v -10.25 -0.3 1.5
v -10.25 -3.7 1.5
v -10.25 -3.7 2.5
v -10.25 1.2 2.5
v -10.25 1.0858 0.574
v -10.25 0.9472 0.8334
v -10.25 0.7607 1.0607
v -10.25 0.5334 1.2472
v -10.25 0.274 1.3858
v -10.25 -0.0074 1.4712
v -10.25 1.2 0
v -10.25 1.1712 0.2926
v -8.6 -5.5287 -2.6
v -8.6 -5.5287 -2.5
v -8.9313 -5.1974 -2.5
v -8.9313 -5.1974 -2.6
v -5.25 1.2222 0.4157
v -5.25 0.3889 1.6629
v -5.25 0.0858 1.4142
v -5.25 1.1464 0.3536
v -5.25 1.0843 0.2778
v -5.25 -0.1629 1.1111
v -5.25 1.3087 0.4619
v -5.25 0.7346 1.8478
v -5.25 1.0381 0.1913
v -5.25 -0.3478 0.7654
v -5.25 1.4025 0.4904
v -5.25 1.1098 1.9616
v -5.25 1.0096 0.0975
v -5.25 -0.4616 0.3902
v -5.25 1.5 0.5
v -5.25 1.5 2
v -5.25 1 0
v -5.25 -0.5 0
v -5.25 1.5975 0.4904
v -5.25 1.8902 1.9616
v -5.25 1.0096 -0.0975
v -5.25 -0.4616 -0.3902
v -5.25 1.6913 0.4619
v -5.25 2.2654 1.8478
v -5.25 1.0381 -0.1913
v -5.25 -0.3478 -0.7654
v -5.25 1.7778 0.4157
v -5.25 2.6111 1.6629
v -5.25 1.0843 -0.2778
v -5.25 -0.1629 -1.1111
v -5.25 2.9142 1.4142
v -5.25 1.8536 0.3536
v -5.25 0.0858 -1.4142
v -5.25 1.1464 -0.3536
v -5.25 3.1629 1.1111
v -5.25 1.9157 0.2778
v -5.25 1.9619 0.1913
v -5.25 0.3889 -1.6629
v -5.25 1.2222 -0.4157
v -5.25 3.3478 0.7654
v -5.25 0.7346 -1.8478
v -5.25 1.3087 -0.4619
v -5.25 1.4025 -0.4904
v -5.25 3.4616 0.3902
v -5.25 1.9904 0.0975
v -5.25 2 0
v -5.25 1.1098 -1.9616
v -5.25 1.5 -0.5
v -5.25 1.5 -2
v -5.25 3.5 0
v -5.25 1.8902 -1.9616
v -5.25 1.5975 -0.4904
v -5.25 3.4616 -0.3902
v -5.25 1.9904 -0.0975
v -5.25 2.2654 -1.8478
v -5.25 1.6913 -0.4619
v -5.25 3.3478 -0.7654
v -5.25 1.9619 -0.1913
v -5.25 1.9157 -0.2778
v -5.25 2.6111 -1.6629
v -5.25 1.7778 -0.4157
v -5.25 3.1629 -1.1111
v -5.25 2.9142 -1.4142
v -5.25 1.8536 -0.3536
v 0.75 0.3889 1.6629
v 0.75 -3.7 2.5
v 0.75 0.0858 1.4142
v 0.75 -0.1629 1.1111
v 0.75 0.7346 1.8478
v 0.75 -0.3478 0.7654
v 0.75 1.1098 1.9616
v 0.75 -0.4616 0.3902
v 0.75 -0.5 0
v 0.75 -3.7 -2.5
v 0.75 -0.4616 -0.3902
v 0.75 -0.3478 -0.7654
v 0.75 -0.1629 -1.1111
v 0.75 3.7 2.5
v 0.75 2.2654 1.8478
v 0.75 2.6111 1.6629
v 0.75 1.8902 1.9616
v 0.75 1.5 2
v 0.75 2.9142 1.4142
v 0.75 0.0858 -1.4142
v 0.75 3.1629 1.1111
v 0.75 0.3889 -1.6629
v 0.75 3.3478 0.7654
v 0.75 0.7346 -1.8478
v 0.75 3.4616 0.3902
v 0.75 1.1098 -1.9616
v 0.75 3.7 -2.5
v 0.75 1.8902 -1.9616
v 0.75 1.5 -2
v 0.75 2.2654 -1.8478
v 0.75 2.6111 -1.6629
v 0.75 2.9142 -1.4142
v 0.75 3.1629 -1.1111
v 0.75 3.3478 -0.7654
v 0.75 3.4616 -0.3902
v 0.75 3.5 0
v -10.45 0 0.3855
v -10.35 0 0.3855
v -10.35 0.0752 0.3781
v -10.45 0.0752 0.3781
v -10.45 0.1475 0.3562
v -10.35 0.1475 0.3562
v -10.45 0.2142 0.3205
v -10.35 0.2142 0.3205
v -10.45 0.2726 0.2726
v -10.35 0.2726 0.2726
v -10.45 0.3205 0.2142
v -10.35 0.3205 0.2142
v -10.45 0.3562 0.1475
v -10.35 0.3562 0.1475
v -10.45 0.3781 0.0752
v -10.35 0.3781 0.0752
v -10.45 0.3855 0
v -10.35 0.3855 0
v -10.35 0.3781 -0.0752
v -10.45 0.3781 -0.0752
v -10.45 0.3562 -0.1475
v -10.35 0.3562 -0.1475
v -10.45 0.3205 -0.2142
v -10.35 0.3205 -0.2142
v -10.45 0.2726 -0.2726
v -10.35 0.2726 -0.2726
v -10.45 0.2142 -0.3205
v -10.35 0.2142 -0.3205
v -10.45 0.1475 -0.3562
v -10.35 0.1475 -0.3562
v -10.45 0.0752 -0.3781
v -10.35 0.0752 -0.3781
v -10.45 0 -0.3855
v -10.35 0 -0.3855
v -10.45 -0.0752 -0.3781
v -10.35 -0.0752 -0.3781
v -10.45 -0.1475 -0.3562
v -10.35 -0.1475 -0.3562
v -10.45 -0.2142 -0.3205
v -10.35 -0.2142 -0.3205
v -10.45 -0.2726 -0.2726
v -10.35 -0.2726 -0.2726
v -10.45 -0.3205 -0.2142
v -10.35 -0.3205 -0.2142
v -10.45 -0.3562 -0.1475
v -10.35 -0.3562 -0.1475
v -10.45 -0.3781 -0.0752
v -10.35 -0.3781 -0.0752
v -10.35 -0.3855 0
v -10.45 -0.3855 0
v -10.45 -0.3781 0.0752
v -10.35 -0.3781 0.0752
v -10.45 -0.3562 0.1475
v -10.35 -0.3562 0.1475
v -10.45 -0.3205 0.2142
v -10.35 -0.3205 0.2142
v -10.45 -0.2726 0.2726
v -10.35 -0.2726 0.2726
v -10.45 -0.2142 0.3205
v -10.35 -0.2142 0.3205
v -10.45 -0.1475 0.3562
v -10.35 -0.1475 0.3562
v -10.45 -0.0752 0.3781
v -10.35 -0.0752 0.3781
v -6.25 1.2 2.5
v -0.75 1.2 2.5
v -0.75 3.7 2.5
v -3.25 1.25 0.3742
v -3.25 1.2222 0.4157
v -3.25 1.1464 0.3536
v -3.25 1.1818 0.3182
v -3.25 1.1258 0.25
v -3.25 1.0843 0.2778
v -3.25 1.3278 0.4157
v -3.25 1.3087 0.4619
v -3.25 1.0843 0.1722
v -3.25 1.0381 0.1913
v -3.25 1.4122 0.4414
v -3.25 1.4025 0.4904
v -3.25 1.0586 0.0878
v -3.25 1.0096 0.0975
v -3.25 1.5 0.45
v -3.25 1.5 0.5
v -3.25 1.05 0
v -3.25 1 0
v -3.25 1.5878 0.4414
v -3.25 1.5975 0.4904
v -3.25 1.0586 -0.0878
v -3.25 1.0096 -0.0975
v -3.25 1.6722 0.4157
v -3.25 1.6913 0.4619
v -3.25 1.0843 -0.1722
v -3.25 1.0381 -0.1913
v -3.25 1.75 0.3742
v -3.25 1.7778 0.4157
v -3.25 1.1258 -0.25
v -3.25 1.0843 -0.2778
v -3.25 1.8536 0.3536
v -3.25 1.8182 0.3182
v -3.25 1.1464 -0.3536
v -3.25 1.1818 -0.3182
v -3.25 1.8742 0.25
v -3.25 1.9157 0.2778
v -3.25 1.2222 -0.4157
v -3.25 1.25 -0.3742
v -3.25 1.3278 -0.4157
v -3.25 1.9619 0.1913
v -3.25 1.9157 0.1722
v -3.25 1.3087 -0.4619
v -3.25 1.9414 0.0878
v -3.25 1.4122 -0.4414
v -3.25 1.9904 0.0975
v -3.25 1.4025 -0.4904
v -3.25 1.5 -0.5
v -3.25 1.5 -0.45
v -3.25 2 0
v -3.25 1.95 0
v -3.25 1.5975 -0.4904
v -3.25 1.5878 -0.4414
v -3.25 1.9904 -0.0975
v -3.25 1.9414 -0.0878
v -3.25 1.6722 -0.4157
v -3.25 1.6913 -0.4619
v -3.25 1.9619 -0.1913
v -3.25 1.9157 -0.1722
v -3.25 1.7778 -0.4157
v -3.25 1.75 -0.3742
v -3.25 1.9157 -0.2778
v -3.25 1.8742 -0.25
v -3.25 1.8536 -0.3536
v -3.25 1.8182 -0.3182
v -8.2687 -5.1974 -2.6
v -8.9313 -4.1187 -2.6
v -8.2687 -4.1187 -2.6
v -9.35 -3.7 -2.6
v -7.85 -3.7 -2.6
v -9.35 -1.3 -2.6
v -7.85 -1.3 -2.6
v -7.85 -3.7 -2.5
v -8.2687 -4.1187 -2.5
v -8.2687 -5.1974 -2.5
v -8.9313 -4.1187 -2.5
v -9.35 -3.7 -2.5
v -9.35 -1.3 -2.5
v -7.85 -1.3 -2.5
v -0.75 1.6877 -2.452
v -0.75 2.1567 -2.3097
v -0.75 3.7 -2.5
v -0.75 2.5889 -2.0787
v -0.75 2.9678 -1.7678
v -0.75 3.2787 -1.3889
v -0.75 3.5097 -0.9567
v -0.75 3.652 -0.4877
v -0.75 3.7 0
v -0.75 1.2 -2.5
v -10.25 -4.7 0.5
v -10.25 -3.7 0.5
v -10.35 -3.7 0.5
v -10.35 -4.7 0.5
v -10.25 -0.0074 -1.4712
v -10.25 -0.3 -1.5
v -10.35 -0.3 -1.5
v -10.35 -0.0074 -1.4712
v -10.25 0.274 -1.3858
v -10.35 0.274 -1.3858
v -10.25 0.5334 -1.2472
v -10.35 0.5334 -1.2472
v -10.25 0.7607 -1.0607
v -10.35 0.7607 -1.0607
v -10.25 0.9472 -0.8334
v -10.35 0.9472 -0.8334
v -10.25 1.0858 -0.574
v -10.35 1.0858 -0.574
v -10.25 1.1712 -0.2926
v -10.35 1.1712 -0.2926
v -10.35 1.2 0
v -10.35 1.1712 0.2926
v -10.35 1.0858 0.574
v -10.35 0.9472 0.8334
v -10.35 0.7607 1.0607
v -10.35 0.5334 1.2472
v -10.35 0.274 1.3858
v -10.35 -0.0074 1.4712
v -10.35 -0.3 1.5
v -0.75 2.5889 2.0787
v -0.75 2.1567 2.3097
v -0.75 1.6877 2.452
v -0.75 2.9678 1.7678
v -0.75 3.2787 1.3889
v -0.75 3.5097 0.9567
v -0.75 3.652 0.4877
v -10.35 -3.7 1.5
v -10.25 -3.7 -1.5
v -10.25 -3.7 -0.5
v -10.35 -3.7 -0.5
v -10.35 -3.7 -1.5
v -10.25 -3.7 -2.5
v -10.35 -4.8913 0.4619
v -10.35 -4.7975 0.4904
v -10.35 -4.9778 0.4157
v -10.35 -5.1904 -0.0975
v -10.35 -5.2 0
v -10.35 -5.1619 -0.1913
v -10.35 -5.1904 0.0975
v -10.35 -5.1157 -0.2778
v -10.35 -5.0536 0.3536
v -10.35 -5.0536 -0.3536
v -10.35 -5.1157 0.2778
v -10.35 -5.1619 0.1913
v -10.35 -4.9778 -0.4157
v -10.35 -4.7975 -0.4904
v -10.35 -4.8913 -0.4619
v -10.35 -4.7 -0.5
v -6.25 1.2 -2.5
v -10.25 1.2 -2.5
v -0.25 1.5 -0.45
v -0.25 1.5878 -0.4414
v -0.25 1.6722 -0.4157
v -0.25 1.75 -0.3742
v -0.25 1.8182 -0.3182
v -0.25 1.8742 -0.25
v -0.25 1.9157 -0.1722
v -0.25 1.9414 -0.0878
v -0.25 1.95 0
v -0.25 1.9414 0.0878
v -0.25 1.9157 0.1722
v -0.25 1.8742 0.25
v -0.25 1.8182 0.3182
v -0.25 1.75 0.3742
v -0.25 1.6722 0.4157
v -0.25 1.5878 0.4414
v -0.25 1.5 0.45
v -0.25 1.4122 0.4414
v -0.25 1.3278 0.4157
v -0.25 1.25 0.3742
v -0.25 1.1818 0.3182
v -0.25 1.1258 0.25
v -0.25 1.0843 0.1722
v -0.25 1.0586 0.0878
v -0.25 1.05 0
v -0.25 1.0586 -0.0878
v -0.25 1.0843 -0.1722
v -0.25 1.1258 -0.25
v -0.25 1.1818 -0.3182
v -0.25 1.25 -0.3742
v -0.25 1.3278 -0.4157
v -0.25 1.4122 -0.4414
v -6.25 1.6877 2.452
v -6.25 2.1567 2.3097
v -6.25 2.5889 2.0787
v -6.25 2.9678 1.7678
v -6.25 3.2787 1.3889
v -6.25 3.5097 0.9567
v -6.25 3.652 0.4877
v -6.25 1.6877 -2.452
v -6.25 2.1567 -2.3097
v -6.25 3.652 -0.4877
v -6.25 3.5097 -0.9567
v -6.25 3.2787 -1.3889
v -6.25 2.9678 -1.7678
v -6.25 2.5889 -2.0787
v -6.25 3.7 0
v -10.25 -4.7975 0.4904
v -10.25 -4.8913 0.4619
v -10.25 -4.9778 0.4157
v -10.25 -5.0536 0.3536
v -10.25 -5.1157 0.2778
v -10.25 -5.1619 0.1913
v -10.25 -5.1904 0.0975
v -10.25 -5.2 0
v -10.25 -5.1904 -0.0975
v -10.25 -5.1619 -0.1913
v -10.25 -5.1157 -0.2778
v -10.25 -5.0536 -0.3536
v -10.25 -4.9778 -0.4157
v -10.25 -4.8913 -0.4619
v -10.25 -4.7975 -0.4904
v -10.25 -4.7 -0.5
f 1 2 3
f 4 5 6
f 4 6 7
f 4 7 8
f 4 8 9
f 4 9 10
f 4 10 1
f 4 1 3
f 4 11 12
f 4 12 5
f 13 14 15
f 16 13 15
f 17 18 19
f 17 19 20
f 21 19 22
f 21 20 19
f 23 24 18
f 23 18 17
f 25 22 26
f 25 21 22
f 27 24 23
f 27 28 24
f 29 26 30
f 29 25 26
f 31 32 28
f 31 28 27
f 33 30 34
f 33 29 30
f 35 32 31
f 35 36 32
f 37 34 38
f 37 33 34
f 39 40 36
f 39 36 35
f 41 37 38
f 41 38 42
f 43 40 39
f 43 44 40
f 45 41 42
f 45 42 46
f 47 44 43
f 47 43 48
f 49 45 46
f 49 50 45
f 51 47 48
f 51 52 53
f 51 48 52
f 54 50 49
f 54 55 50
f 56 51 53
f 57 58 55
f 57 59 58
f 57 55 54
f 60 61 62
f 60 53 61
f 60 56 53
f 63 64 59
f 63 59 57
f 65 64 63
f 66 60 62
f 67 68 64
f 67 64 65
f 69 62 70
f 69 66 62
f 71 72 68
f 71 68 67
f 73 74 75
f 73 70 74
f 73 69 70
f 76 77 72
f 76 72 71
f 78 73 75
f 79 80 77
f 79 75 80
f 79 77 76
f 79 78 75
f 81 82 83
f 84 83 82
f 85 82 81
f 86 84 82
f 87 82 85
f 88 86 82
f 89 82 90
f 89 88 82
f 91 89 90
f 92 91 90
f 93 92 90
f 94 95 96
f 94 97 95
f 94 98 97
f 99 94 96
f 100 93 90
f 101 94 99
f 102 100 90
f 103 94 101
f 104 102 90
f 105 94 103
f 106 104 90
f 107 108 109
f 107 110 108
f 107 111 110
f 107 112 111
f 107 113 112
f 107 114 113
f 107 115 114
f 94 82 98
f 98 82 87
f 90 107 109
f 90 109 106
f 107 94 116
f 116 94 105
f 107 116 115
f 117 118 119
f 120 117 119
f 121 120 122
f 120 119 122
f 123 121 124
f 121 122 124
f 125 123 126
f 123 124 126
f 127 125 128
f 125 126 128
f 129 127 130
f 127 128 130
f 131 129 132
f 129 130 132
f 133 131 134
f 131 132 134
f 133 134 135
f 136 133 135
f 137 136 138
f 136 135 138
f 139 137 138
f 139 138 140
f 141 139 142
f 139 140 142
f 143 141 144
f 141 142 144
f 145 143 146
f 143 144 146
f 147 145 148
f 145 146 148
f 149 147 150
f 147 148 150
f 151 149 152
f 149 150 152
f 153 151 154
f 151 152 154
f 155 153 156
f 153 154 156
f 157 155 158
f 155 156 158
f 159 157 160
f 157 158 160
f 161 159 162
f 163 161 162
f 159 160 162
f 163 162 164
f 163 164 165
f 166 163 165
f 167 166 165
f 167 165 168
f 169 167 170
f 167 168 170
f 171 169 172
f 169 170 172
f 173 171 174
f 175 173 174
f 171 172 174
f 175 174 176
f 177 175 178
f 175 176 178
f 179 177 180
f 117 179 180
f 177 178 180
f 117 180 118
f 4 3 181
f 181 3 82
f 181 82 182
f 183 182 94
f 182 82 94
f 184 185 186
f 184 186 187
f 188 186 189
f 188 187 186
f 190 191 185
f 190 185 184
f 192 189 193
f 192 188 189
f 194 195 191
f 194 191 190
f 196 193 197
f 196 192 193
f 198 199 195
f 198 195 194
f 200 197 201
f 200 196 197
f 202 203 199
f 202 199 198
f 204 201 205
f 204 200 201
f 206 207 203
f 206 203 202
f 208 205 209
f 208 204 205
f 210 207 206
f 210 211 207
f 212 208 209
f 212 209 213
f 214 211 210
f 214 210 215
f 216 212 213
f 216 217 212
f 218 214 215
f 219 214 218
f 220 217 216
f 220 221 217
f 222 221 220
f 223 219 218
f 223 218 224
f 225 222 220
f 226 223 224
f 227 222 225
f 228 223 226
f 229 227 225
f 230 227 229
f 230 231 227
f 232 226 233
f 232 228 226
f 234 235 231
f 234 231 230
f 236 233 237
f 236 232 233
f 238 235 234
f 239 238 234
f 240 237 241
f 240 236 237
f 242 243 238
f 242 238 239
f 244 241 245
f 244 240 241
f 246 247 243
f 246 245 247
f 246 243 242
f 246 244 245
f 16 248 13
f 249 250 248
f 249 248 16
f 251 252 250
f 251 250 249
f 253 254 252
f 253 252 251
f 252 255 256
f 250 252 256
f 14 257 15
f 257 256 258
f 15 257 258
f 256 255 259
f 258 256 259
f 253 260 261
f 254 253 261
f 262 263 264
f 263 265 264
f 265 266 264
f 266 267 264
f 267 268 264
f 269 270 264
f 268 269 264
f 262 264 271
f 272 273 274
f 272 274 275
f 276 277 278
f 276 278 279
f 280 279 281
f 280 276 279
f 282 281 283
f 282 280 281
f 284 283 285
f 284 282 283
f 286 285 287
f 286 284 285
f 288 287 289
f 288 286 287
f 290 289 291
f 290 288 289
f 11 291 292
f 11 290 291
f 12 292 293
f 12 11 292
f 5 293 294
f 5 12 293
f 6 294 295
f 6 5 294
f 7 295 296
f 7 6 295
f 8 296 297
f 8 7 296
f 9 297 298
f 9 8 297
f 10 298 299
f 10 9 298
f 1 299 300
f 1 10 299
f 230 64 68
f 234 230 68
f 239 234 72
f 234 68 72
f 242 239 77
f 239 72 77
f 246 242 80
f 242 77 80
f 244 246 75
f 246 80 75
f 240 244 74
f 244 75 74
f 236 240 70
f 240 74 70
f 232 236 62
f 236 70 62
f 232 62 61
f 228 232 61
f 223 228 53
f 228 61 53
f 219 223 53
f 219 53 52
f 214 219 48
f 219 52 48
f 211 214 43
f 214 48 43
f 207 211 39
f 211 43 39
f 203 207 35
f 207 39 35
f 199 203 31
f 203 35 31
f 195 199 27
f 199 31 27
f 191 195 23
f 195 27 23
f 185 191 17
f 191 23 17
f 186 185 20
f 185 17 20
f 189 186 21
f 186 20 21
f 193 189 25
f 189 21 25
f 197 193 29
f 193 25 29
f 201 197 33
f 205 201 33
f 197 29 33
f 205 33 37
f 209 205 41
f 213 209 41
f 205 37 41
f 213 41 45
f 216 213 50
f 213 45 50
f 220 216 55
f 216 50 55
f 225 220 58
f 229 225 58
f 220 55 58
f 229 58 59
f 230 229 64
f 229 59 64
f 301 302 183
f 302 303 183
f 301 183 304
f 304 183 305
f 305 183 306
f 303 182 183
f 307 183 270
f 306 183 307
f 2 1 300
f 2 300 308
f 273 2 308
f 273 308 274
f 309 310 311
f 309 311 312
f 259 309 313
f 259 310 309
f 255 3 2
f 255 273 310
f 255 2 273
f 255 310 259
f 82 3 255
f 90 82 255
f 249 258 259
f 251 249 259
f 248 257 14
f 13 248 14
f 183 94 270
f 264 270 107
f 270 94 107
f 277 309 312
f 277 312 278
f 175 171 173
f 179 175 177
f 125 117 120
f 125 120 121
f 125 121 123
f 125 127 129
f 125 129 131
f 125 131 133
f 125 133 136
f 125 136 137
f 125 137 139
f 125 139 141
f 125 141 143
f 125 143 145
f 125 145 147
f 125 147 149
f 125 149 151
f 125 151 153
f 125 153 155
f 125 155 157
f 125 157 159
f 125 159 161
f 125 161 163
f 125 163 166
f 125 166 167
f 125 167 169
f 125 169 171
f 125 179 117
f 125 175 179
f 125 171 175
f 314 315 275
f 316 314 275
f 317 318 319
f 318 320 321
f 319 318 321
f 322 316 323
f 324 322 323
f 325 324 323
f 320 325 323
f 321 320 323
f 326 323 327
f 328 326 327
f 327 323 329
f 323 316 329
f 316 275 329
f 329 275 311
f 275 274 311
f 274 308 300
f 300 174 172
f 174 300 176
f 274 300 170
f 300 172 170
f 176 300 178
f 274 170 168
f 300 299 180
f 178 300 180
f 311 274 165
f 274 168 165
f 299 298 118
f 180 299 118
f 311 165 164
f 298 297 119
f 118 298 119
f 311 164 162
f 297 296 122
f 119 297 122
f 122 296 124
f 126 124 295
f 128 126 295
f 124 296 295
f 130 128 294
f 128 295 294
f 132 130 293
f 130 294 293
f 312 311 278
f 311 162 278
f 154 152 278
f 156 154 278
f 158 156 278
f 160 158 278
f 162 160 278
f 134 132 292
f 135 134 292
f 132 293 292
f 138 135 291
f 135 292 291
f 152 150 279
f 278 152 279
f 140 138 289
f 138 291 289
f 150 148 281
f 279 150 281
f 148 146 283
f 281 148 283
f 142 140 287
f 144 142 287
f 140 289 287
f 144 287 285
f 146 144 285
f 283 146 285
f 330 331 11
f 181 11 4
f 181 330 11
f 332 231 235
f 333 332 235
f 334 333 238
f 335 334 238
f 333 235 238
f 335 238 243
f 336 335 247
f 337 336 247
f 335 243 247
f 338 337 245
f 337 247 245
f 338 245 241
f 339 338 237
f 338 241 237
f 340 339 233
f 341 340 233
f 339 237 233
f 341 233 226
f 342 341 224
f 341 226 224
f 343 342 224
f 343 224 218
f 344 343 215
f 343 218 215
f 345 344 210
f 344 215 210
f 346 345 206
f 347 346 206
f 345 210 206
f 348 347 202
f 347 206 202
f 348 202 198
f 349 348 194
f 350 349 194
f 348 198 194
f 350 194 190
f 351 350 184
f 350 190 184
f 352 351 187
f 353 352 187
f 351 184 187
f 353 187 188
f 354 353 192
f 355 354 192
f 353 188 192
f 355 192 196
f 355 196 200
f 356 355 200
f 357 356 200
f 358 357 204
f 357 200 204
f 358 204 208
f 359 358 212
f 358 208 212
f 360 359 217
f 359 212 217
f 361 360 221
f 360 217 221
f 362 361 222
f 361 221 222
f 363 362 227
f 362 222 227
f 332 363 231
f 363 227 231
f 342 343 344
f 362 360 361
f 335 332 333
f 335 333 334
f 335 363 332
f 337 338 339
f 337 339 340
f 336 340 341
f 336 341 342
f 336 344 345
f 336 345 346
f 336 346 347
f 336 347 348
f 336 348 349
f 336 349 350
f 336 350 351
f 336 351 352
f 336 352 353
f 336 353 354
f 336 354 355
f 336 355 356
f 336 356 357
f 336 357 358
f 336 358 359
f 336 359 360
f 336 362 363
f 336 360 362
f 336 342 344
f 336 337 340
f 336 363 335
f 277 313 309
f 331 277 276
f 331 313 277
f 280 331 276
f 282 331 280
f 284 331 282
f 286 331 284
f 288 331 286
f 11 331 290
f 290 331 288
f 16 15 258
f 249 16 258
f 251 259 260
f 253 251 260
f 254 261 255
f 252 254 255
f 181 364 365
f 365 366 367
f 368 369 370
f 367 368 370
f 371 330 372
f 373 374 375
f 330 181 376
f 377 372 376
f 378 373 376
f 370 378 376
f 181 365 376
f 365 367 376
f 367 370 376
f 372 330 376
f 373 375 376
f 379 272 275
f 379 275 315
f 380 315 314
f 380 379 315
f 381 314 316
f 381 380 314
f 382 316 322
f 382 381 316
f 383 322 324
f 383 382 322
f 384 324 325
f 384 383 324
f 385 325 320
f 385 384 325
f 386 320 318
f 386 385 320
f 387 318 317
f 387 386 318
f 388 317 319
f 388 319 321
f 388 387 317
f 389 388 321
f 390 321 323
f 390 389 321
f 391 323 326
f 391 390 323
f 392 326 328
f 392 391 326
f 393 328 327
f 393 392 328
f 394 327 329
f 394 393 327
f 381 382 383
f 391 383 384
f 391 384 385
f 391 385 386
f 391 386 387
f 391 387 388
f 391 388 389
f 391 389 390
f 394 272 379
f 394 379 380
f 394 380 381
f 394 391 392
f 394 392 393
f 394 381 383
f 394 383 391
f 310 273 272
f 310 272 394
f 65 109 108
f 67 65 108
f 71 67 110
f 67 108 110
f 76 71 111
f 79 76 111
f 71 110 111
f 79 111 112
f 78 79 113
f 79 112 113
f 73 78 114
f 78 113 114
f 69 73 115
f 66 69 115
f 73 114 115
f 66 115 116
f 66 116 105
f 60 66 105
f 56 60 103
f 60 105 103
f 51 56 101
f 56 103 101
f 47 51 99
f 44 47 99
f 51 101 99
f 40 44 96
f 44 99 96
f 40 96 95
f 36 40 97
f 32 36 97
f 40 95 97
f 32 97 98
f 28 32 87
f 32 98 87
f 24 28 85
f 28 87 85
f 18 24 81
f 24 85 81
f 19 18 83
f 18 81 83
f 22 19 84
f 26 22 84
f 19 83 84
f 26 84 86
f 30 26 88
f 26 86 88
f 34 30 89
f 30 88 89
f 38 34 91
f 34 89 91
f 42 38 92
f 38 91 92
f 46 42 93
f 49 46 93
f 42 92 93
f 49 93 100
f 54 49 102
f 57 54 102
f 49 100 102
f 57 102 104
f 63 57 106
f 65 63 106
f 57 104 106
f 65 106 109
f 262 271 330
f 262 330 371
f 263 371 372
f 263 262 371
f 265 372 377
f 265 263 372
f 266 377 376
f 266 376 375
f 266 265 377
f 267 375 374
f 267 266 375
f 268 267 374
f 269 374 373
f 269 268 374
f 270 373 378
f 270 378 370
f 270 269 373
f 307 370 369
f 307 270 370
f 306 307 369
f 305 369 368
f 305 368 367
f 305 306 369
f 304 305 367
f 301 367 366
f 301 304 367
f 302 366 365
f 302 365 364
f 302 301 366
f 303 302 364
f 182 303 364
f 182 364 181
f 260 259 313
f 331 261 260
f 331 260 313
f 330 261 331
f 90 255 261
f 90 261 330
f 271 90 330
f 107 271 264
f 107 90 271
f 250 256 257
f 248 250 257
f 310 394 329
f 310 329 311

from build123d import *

# Parameters (mm, degrees)
CROQUIS1_W     = 5
CROQUIS1_H     = 7.4
EXTRUIR1_DEPTH = 0.75
EXTRUIR2_DEPTH = 5.5
CROQUIS3_W     = 5
CROQUIS3_H     = 4.9
EXTRUIR3_DEPTH = 4
CROQUIS4_R     = 2
EXTRUIR4_DEPTH = 6
CROQUIS5_R     = 0.5
EXTRUIR5_DEPTH = 2
CROQUIS6_R     = 0.45
EXTRUIR6_DEPTH = 3
EXTRUIR7_DEPTH = 0.1
CROQUIS8_R     = 0.385516529
EXTRUIR8_DEPTH = 0.1
EXTRUIR9_DEPTH = 0.1


with BuildPart() as part:
    # Croquis1 → Extruir1 (new, symmetric)
    with BuildSketch(Plane(origin=(0, 0, 0), x_dir=(0, 0, -1), z_dir=(1, 0, 0))):
        Rectangle(CROQUIS1_W, CROQUIS1_H)
    extrude(amount=EXTRUIR1_DEPTH, both=True)

    # Croquis2 → Extruir2 (add)
    with BuildSketch(Plane.ZY.offset(0.75)):
        with BuildLine():
            Line((-2.5, -3.7), (-2.5, 1.2))
            ThreePointArc((-2.5, 1.2), (0, 3.7), (2.5, 1.2))
            Line((2.5, 1.2), (2.5, -3.7))
            Line((2.5, -3.7), (-2.5, -3.7))
        make_face()
    extrude(amount=EXTRUIR2_DEPTH)

    # Croquis3 → Extruir3 (add)
    with BuildSketch(Plane.ZY.offset(6.25)):
        with Locations((0, -1.25)):
            Rectangle(CROQUIS3_W, CROQUIS3_H)
    extrude(amount=EXTRUIR3_DEPTH)

    # Croquis4 → Extruir4 (cut)
    with BuildSketch(Plane(origin=(0.75, 0, 0), x_dir=(0, 0, -1), z_dir=(1, 0, 0))):
        with Locations((0, 1.5)):
            Circle(CROQUIS4_R)
    extrude(amount=-EXTRUIR4_DEPTH, mode=Mode.SUBTRACT)

    # Croquis5 → Extruir5 (add)
    with BuildSketch(Plane(origin=(-5.25, 0, 0), x_dir=(0, 0, -1), z_dir=(1, 0, 0))):
        with Locations((0, 1.5)):
            Circle(CROQUIS5_R)
    extrude(amount=EXTRUIR5_DEPTH)

    # Croquis6 → Extruir6 (add)
    with BuildSketch(Plane(origin=(-3.25, 0, 0), x_dir=(0, 0, -1), z_dir=(1, 0, 0))):
        with Locations((0, 1.5)):
            Circle(CROQUIS6_R)
    extrude(amount=EXTRUIR6_DEPTH)

    # Croquis7 → Extruir7 (add)
    with BuildSketch(Plane.ZY.offset(10.25)):
        with BuildLine():
            Line((-1.5, -3.7), (-1.5, -0.3))
            ThreePointArc((-1.5, -0.3), (0, 1.2), (1.5, -0.3))
            Line((1.5, -0.3), (1.5, -3.7))
            Line((1.5, -3.7), (0.5, -3.7))
            Line((0.5, -3.7), (0.5, -4.7))
            ThreePointArc((0.5, -4.7), (0, -5.2), (-0.5, -4.7))
            Line((-0.5, -4.7), (-0.5, -3.7))
            Line((-0.5, -3.7), (-1.5, -3.7))
        make_face()
    extrude(amount=EXTRUIR7_DEPTH)

    # Croquis8 → Extruir8 (add)
    with BuildSketch(Plane.ZY.offset(10.35)):
        Circle(CROQUIS8_R)
    extrude(amount=EXTRUIR8_DEPTH)

    # Croquis9 → Extruir9 (add)
    with BuildSketch(Plane(origin=(0, 0, -2.5), x_dir=(-1, 0, 0), z_dir=(0, 0, -1))):
        Polygon((7.85, -3.7), (8.268709763, -4.118709763), (8.268709763, -5.1974269), (8.6, -5.528717137), (8.931290237, -5.1974269), (8.931290237, -4.118709763), (9.35, -3.7), (9.35, -1.3), (7.85, -1.3), align=None)
    extrude(amount=EXTRUIR9_DEPTH)


solid = part.part
